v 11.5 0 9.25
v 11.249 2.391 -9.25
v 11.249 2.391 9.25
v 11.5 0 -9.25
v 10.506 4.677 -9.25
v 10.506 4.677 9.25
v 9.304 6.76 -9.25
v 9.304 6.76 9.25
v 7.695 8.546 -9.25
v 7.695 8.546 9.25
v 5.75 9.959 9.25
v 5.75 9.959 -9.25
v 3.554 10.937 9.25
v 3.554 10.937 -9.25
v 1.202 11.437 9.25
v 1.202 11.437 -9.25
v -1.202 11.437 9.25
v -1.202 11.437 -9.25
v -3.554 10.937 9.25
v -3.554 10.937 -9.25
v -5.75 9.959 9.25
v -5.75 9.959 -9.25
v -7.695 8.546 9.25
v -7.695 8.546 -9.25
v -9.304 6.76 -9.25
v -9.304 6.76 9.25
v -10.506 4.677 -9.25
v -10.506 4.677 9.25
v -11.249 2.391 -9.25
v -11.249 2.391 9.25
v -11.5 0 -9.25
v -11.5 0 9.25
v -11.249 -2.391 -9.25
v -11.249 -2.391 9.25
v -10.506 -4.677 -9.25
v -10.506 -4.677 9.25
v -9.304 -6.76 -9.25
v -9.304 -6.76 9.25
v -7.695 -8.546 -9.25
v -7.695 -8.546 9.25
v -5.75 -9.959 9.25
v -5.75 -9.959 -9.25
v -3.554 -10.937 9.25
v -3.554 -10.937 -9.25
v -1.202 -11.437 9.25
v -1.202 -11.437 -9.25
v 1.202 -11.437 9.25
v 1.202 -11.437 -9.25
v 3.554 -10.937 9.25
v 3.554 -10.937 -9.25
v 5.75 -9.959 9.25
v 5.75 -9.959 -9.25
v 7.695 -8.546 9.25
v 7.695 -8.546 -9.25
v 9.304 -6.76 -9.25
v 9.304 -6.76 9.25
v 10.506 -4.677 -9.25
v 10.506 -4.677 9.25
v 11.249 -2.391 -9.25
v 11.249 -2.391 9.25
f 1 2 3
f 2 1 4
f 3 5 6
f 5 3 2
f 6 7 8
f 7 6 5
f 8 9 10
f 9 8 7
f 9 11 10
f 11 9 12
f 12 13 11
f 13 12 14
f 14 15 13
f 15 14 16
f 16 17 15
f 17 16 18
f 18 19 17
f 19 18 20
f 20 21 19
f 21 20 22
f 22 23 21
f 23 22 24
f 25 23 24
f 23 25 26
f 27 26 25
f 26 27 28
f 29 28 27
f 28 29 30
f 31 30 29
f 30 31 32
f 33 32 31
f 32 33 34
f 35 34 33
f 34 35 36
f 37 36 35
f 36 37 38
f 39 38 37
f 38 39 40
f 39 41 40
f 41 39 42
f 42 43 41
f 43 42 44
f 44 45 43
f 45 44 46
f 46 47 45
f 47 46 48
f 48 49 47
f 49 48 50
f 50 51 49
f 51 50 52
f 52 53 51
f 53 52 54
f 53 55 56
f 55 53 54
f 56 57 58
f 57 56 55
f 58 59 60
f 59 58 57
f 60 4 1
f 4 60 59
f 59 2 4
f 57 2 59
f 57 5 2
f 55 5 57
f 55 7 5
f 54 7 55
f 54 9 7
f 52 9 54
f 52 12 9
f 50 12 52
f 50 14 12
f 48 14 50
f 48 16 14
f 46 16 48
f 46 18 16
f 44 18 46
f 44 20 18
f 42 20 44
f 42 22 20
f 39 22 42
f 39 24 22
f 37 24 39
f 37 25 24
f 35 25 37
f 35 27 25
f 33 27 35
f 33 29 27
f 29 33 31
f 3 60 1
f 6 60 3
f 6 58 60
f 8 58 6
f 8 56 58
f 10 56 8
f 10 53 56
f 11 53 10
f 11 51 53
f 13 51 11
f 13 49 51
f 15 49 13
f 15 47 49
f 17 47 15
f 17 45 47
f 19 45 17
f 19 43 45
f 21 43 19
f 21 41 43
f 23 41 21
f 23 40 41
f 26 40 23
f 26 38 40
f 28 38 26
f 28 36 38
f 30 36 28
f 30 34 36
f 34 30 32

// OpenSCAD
// file: params.scad
DOME_DIA = 150;
DOME_THICK = 2.5;
ORING_DIA = 5.0;

function r_from_dia(d) = d / 2;
// main file
include<params.scad>

module flow_cylinder()
{
    translate([0,0,0])
        cylinder(r=r_from_dia(23), h=18.5, center=true);
}

flow_cylinder();
